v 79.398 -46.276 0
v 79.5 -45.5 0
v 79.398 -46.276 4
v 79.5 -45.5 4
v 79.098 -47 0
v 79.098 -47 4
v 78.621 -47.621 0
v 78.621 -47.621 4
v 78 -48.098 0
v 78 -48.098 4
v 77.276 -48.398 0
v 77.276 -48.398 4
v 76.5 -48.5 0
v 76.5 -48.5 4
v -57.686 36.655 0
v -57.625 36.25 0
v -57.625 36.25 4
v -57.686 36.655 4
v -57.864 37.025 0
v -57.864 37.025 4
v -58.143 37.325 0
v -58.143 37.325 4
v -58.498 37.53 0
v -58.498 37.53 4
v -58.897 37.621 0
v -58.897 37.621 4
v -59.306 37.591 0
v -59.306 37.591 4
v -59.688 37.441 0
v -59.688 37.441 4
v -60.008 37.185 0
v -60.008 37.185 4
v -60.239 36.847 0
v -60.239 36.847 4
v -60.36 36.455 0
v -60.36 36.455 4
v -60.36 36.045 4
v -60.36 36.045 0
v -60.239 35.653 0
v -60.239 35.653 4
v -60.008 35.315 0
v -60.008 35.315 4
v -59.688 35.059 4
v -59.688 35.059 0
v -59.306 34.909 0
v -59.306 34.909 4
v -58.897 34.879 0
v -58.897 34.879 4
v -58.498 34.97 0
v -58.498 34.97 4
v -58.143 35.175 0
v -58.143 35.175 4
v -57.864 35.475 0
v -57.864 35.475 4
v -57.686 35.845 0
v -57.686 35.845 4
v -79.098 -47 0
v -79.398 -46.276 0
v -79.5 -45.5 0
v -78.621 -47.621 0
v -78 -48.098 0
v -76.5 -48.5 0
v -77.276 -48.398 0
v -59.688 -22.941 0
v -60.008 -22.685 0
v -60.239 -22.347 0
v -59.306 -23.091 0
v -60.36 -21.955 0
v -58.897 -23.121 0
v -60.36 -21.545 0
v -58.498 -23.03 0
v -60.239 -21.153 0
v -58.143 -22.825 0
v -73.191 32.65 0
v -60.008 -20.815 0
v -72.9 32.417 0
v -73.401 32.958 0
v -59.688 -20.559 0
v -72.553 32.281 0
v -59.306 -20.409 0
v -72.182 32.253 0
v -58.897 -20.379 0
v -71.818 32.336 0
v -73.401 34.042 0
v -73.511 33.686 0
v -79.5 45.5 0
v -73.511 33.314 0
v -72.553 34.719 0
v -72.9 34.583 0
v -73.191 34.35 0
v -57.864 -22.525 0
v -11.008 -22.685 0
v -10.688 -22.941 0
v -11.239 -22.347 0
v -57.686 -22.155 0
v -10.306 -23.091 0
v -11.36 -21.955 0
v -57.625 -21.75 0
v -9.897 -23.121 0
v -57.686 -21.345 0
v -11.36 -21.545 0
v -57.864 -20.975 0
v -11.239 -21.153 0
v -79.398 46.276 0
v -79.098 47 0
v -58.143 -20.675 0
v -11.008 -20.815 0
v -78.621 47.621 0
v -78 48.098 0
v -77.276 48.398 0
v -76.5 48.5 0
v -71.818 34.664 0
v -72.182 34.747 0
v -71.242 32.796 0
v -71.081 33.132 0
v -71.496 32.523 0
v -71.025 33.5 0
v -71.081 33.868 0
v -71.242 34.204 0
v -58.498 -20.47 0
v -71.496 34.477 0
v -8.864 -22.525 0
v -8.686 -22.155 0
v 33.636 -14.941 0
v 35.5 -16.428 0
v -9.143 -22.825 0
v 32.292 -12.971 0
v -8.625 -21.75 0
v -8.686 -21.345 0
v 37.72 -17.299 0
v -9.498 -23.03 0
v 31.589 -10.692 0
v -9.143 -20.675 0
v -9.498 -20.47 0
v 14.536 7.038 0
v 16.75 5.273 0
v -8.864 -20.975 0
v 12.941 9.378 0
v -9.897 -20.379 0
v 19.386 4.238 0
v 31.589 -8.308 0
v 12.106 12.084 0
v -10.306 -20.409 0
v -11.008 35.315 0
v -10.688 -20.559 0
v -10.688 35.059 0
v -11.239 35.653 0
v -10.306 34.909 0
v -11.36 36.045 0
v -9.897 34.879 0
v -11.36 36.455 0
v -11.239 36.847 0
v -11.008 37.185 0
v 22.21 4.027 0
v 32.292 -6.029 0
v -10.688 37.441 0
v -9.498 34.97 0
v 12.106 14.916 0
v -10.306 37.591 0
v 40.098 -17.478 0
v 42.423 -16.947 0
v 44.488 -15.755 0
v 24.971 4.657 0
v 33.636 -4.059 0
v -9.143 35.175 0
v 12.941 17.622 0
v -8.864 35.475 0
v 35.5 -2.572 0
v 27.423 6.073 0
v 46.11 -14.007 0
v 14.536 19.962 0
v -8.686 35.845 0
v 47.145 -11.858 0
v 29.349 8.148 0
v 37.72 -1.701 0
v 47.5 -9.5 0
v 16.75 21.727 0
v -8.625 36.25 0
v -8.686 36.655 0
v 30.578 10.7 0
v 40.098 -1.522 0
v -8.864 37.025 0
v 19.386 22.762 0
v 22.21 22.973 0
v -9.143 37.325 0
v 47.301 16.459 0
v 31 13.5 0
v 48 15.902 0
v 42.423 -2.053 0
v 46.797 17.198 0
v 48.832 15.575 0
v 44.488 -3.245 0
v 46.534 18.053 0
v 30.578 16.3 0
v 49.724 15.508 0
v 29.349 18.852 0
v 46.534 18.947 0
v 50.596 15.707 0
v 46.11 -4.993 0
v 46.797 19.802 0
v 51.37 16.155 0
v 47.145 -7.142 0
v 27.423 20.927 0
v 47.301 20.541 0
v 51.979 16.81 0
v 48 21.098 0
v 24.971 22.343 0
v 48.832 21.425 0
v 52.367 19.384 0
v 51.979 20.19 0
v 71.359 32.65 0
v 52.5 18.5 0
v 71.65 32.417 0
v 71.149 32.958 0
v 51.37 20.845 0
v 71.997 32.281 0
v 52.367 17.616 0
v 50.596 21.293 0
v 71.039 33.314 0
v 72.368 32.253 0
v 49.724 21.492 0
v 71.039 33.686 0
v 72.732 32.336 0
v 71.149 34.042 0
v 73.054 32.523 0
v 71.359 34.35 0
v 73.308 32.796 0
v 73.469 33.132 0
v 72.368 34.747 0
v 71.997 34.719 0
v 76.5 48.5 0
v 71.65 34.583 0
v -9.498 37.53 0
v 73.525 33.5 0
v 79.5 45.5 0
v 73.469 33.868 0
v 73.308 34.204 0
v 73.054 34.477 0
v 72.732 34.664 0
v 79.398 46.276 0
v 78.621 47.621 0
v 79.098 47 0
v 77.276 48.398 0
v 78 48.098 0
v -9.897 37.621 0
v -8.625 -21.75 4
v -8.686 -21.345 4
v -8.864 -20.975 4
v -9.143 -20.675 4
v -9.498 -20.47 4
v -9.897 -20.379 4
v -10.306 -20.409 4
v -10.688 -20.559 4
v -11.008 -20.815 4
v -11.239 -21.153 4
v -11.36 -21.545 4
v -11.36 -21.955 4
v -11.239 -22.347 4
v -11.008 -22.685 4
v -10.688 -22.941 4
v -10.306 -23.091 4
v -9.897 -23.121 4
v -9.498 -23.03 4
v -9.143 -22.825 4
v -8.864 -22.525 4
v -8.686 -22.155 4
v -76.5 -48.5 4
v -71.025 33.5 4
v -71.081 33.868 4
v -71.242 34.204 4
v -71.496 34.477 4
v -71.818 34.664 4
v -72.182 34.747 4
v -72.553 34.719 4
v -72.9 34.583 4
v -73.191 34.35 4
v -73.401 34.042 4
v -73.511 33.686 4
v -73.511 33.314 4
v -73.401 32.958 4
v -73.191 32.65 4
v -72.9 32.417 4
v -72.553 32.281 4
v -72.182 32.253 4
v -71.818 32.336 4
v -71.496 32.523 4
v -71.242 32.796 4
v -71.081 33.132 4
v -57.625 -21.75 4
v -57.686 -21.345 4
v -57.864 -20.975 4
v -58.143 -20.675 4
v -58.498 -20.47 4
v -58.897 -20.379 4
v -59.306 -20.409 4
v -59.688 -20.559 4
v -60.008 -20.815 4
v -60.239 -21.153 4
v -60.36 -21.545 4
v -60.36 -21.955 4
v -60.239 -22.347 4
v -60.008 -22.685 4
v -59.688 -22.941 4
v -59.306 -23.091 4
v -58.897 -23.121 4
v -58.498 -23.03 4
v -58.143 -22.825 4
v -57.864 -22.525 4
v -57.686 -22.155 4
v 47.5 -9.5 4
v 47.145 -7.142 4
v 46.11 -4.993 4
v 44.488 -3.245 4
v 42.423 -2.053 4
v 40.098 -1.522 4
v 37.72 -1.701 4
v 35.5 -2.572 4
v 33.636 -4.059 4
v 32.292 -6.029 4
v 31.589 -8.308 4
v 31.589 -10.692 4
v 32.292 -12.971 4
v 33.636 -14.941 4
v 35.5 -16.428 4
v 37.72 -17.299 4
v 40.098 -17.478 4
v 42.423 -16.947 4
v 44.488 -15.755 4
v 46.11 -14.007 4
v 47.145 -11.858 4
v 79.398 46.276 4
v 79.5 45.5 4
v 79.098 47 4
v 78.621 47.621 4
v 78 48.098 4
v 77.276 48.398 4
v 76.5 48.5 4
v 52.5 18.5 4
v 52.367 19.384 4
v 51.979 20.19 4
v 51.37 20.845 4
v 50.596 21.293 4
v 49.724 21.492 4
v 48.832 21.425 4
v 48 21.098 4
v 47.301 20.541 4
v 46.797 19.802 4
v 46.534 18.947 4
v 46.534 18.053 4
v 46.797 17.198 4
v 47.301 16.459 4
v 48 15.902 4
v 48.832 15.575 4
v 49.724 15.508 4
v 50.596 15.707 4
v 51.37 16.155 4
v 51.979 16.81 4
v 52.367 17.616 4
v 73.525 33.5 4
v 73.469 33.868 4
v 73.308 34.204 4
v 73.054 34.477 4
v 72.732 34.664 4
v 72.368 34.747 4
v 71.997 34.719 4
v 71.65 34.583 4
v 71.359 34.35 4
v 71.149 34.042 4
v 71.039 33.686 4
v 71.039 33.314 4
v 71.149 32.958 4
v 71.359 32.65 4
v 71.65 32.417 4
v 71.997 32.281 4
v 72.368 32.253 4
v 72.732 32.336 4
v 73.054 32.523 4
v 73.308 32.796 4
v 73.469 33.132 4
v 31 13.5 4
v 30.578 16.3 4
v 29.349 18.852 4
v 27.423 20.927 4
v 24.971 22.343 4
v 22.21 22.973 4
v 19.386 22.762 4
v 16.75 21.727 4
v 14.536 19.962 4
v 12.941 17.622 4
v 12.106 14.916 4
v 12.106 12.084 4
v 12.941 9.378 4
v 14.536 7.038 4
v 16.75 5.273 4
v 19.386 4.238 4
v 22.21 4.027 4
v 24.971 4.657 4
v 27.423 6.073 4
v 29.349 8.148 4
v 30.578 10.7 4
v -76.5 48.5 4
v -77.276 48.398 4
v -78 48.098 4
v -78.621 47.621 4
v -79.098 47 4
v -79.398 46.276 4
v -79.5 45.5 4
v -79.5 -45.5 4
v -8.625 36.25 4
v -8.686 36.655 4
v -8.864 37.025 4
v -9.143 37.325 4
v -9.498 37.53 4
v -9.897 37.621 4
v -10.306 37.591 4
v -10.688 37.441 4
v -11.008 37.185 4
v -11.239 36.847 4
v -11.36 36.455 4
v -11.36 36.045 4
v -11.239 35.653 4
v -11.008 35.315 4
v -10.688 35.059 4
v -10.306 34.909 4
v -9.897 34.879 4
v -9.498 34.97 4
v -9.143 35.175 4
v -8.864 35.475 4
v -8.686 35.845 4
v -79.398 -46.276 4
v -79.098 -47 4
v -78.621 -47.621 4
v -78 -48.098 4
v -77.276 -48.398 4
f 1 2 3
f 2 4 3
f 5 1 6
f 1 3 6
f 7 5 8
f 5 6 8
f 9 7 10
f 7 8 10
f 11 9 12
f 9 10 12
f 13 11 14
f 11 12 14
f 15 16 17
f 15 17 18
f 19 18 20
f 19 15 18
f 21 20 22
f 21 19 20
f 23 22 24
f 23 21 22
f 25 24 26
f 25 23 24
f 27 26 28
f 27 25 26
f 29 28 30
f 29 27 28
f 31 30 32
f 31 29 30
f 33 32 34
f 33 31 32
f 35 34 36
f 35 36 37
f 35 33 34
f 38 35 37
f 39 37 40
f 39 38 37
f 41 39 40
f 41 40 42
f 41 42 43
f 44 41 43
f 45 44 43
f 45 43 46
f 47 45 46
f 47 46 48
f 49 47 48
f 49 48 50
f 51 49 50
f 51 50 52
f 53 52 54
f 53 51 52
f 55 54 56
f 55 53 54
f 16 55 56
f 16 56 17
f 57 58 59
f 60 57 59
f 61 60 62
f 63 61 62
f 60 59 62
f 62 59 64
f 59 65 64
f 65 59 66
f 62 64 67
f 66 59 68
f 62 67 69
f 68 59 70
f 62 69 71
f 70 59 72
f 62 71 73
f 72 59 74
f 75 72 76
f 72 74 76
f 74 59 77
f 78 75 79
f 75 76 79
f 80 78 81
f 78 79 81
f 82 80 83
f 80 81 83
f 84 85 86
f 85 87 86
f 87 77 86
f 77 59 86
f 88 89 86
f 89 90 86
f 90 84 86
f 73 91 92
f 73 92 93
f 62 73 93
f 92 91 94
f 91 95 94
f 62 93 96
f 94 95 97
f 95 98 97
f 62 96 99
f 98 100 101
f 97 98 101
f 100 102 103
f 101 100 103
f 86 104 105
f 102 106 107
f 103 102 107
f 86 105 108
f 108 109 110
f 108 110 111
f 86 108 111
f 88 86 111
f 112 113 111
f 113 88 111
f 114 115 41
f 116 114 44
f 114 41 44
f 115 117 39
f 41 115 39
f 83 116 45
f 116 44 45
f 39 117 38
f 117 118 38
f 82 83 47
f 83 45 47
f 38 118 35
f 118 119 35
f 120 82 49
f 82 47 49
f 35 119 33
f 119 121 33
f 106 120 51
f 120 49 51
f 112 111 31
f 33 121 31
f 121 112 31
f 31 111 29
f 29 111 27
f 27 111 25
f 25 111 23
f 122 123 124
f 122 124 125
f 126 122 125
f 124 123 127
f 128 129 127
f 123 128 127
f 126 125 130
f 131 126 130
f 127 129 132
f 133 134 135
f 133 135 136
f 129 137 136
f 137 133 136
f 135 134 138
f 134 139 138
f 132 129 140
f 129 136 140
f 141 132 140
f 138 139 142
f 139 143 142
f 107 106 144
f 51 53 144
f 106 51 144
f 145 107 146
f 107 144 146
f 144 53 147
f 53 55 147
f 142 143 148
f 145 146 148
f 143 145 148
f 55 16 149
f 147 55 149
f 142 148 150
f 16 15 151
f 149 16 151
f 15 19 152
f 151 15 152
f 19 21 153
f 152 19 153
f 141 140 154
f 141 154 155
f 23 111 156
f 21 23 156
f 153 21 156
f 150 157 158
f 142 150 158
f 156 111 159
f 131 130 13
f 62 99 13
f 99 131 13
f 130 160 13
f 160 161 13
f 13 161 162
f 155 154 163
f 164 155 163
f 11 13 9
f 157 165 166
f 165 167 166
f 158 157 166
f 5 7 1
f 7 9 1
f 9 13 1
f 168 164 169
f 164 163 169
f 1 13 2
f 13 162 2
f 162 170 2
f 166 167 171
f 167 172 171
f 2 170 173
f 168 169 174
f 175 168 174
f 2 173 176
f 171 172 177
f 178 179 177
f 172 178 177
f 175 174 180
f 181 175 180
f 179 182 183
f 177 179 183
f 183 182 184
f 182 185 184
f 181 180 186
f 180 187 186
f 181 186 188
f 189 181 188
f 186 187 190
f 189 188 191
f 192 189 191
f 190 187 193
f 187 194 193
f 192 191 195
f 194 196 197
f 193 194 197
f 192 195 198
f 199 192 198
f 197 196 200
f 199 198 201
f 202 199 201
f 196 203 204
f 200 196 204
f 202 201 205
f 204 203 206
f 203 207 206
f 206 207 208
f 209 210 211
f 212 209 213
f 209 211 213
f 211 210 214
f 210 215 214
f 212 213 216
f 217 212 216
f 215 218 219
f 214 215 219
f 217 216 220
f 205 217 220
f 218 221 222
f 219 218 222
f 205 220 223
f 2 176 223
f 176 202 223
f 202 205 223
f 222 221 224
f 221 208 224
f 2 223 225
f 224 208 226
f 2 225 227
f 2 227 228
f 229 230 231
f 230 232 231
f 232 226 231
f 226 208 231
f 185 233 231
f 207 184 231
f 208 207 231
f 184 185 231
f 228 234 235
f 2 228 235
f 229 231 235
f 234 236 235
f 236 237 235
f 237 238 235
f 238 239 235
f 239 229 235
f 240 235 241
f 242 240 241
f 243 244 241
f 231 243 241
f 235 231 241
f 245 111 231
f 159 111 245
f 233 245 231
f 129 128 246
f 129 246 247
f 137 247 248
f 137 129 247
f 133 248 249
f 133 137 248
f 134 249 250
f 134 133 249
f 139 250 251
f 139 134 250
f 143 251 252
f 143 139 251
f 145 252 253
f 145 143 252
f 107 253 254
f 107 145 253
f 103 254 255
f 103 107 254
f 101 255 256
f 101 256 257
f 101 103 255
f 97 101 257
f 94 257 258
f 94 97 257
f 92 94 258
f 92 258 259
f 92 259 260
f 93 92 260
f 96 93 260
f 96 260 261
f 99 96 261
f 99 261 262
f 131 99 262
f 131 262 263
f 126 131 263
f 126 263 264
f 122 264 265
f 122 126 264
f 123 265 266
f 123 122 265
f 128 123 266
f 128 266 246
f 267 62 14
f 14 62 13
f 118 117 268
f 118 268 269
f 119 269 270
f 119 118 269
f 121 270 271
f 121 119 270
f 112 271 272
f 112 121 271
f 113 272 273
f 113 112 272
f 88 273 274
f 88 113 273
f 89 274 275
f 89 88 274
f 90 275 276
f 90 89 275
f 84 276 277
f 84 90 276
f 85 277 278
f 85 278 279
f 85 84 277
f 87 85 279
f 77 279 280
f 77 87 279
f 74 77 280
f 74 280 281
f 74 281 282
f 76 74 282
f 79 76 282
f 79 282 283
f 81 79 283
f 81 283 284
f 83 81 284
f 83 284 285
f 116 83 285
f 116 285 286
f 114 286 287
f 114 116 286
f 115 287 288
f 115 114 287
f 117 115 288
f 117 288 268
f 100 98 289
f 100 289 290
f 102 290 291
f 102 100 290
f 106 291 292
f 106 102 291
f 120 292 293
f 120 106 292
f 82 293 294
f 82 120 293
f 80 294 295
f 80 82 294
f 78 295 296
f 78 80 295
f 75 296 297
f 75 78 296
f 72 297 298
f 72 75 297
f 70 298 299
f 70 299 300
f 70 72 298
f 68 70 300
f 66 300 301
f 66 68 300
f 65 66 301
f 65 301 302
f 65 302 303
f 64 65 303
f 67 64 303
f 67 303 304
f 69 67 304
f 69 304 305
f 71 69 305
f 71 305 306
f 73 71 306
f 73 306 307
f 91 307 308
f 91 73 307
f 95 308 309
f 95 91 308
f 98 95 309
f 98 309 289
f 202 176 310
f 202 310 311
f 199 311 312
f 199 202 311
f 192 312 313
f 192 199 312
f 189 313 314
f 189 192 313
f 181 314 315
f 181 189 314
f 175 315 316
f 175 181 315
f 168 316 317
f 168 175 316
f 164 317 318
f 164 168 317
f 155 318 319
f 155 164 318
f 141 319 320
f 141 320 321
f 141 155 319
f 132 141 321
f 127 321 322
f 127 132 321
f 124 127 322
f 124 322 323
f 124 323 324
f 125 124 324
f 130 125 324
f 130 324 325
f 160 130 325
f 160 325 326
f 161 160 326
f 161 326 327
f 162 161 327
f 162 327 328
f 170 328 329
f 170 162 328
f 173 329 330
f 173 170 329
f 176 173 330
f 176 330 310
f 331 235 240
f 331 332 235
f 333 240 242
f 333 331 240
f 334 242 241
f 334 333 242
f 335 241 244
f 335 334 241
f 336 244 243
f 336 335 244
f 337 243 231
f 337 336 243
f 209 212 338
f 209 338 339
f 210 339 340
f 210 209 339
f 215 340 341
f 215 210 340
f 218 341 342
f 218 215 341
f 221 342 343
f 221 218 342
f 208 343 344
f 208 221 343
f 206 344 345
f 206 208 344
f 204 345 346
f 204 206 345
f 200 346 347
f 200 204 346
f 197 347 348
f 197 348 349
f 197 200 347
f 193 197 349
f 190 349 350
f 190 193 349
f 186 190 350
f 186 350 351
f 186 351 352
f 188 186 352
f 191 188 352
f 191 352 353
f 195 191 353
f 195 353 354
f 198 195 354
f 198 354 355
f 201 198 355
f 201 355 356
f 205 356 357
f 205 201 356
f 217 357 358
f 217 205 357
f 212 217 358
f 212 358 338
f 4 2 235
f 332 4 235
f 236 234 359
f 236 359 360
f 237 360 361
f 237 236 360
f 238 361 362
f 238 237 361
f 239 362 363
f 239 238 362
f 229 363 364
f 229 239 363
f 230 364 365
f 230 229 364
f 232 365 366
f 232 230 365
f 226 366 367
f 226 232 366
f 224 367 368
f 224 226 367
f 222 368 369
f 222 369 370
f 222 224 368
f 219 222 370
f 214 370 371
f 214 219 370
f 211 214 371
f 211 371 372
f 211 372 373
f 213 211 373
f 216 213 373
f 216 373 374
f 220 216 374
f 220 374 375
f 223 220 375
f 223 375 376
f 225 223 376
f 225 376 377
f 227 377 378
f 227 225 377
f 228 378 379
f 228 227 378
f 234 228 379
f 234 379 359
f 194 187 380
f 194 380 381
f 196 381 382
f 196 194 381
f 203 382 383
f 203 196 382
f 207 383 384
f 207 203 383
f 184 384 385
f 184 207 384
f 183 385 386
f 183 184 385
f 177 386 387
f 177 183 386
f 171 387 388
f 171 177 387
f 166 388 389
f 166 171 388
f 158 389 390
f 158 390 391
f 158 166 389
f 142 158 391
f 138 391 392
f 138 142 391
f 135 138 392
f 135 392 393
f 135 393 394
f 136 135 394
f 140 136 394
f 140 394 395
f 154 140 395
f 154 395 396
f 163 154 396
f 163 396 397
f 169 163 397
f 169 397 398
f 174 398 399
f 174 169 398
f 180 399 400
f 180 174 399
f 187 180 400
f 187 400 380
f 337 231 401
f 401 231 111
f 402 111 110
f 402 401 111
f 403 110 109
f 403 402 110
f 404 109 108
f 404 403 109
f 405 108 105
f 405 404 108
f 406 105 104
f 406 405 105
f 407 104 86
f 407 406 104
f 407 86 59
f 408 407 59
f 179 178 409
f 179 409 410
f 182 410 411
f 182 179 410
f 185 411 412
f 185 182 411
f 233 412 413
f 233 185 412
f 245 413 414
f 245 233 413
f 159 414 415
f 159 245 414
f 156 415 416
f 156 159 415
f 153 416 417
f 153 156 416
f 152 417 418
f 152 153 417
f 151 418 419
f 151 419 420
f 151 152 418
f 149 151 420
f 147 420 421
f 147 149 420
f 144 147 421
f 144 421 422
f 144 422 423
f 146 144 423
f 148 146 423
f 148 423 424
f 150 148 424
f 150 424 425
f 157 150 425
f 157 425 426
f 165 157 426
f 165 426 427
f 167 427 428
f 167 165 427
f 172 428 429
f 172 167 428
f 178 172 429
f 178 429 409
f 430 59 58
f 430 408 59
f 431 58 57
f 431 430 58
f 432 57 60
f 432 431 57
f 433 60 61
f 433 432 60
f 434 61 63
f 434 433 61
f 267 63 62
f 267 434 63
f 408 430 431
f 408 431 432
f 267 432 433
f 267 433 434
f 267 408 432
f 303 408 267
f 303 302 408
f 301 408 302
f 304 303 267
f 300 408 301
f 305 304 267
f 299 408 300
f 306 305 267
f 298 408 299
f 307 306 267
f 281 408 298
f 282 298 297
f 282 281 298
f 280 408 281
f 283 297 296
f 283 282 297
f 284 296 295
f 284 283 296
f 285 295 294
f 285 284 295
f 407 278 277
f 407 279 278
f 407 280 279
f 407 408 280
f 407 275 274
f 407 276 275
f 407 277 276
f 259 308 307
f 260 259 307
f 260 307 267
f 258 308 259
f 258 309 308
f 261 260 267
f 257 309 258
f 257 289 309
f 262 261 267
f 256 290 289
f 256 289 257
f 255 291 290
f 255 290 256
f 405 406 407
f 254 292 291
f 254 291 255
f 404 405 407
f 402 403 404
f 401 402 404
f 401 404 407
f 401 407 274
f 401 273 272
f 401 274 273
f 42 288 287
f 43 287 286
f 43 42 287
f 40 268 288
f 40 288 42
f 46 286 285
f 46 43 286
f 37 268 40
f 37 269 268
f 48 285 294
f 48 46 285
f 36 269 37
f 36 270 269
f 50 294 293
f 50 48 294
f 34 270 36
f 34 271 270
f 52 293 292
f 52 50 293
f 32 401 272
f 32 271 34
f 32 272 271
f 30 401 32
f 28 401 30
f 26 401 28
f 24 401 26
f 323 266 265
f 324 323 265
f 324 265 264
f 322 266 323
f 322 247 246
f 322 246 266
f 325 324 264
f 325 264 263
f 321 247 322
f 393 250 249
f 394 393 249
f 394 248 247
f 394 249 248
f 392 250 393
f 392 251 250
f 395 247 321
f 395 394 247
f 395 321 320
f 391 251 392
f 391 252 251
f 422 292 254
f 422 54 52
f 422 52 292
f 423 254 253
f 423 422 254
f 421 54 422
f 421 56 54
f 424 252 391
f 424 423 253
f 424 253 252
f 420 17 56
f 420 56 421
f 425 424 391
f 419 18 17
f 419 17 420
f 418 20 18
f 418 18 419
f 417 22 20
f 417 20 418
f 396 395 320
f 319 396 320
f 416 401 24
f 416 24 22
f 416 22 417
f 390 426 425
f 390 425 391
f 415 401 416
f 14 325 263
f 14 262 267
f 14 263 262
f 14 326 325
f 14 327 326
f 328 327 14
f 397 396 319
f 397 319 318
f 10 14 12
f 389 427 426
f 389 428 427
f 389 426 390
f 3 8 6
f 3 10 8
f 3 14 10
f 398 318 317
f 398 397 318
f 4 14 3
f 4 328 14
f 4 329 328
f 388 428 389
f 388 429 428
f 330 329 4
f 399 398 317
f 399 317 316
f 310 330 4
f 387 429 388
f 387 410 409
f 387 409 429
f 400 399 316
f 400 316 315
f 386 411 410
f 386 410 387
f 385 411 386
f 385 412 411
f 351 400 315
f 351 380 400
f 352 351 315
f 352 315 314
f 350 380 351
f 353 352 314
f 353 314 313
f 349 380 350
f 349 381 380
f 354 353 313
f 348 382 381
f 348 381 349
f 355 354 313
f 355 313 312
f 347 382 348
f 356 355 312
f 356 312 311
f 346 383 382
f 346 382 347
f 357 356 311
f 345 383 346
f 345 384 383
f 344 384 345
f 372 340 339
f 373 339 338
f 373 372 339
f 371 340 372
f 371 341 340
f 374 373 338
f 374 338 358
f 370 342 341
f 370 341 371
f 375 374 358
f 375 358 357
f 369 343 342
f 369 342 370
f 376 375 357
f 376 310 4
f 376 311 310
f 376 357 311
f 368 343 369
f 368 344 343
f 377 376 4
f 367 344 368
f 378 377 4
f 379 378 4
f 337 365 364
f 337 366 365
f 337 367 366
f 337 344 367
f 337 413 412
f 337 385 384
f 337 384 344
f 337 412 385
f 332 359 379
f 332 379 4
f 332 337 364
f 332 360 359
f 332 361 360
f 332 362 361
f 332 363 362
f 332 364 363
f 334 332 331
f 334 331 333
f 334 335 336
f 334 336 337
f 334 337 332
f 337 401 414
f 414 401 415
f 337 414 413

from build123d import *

# Parameters (mm, degrees)
F0_R     = 1.375
F0_R_2   = 1.25
F0_R_3   = 8
F0_R_4   = 9.5
F0_R_5   = 3
F1_DEPTH = 4
F2_R     = 3


with BuildPart() as f1:
    # F0 (on Top) → F1 (new body)
    with BuildSketch(Plane.XY):
        with BuildLine():
            Line((-4.7679491924, -48.5), (79.5, -48.5))
            Line((79.5, -48.5), (79.5, 48.5))
            Line((79.5, 48.5), (-79.5, 48.5))
            Line((-79.5, 48.5), (-79.5, -48.5))
            Line((-79.5, -48.5), (-64.2320508076, -48.5))
            ThreePointArc((-64.2320508076, -48.5), (-62.5, -47.5), (-60.7679491924, -48.5))
            Line((-60.7679491924, -48.5), (-8.2320508076, -48.5))
            ThreePointArc((-8.2320508076, -48.5), (-6.5, -47.5), (-4.7679491924, -48.5))
        make_face()
        with Locations((-59, -21.75)):
            Circle(F0_R, mode=Mode.SUBTRACT)
        with Locations((-10, -21.75)):
            Circle(F0_R, mode=Mode.SUBTRACT)
        with Locations((-72.275, 33.5)):
            Circle(F0_R_2, mode=Mode.SUBTRACT)
        with Locations((-59, 36.25)):
            Circle(F0_R, mode=Mode.SUBTRACT)
        with Locations((-10, 36.25)):
            Circle(F0_R, mode=Mode.SUBTRACT)
        with Locations((39.5, -9.5)):
            Circle(F0_R_3, mode=Mode.SUBTRACT)
        with Locations((21.5, 13.5)):
            Circle(F0_R_4, mode=Mode.SUBTRACT)
        with Locations((49.5, 18.5)):
            Circle(F0_R_5, mode=Mode.SUBTRACT)
        with Locations((72.275, 33.5)):
            Circle(F0_R_2, mode=Mode.SUBTRACT)
        with BuildLine():
            Line((-8.2320508076, -48.5), (-4.7679491924, -48.5))
            ThreePointArc((-4.7679491924, -48.5), (-6.5, -47.5), (-8.2320508076, -48.5))
        make_face()
        with BuildLine():
            Line((-64.2320508076, -48.5), (-60.7679491924, -48.5))
            ThreePointArc((-60.7679491924, -48.5), (-62.5, -47.5), (-64.2320508076, -48.5))
        make_face()
    extrude(amount=F1_DEPTH)

    # F2
    f2_edges = [f1.edges().sort_by_distance(p)[0] for p in [
        (-79.5, 48.5, 2),
        (79.5, 48.5, 2),
        (79.5, -48.5, 2),
        (-79.5, -48.5, 2),
    ]]
    fillet(f2_edges, radius=F2_R)


solid = f1.part
